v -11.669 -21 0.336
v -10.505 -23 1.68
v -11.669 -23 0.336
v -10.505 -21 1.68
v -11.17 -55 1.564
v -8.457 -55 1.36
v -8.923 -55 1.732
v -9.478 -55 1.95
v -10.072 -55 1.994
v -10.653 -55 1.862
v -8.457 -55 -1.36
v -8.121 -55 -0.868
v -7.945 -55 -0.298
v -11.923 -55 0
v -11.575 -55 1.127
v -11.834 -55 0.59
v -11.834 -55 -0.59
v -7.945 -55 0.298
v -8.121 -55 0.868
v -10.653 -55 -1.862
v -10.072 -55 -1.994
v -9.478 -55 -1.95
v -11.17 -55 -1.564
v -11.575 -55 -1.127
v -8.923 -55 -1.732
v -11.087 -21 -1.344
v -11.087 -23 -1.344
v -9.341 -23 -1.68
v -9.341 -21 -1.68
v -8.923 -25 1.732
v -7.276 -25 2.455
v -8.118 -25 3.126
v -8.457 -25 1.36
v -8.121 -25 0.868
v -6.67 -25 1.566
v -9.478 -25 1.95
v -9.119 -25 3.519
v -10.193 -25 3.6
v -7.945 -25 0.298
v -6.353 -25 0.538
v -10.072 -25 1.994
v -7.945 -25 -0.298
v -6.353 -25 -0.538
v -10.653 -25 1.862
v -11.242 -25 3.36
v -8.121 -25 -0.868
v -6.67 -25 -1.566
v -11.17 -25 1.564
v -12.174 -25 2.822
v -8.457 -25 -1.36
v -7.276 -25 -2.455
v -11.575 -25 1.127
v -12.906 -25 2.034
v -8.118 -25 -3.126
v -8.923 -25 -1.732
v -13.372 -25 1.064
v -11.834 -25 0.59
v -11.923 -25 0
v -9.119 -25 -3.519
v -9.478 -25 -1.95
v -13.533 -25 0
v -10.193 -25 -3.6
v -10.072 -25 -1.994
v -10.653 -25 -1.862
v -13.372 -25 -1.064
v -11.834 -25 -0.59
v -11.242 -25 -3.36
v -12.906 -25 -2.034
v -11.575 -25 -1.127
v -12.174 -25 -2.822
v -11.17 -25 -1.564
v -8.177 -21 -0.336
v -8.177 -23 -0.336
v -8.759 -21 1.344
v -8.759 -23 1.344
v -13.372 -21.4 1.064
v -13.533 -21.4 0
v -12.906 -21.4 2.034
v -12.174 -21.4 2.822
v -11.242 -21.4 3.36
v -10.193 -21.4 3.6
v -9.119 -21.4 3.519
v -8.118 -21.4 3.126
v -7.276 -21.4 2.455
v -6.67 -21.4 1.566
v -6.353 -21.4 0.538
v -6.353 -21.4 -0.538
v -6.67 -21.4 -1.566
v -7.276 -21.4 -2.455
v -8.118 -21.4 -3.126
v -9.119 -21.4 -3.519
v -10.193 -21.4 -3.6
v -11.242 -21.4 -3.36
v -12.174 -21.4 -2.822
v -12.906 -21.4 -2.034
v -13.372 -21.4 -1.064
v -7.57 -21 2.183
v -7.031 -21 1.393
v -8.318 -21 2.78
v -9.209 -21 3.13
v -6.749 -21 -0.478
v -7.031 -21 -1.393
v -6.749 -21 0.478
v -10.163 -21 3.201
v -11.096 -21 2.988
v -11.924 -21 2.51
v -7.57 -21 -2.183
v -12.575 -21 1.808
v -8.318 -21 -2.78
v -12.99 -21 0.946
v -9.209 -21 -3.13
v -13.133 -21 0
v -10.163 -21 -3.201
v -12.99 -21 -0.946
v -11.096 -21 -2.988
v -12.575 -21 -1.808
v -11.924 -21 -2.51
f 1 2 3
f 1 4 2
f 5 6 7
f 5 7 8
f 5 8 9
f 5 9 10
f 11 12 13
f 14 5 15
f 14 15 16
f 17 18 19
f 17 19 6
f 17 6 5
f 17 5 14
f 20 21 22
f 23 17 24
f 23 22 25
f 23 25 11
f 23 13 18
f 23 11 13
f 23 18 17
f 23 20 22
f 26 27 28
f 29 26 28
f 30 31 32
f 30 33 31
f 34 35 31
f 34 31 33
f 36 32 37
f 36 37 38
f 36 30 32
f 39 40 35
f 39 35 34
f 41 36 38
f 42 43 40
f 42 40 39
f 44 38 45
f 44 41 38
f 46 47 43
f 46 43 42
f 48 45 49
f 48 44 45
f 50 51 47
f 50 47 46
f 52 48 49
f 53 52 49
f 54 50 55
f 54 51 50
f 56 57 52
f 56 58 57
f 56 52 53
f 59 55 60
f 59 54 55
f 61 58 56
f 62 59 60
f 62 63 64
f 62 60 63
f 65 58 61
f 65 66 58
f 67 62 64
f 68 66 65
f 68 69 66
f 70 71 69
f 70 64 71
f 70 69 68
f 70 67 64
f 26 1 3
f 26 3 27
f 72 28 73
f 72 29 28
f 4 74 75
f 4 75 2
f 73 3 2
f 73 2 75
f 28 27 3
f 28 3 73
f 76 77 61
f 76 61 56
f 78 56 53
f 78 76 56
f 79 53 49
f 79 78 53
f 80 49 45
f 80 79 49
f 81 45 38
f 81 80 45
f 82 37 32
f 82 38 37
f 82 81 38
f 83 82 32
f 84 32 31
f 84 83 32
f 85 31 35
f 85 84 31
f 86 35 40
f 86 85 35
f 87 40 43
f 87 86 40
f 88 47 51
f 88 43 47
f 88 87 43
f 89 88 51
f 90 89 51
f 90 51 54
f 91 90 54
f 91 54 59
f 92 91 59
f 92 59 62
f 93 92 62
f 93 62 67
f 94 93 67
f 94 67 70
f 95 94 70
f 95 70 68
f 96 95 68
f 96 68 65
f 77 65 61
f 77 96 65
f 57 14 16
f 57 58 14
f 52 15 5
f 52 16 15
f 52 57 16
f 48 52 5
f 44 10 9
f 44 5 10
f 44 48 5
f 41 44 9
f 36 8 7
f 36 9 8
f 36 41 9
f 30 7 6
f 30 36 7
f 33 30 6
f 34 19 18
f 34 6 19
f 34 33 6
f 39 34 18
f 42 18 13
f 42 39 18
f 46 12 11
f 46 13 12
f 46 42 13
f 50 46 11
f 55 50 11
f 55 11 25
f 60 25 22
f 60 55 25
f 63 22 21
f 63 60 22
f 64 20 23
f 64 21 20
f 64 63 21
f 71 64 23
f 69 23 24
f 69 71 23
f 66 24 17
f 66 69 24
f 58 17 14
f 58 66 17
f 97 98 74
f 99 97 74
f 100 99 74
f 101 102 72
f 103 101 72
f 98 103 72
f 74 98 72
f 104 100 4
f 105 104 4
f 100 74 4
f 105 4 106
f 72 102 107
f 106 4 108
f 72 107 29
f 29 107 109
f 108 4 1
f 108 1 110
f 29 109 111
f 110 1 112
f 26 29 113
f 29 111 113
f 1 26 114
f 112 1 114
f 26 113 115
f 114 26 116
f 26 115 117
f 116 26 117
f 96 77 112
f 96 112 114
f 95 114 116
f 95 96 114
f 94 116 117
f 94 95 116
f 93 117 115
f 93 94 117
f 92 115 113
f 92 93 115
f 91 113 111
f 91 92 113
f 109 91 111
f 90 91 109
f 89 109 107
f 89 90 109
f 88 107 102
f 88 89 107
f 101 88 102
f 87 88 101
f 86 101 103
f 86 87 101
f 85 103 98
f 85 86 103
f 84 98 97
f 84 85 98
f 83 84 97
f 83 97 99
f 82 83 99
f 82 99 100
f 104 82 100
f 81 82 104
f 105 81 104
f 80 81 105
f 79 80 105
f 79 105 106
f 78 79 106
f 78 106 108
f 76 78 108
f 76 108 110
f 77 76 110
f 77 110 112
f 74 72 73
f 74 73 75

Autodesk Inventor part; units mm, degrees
ref_plane "YZ Plane" through (0, 0, 0) normal (1, 0, 0) x (0, 1, 0)
ref_plane "XZ Plane" through (0, 0, 0) normal (0, 1, 0) x (-1, 0, 0)
ref_plane "XY Plane" through (0, 0, 0) normal (0, 0, 1) x (1, 0, 0)
sketch "Sketch1" plane through (0, 0, 0) normal (0, 0, 1) x (1, 0, 0)
  line L0 (-9.9228, -25) -> (-13.5328, -25)
  line L1 (-13.5328, -25) -> (-13.5328, -21)
  line L2 (-13.5328, -21) -> (-9.9228, -21)
  line L3 (-9.9228, -21) -> (-9.9228, -25)
  line L4 (-9.9228, -25) -> (-9.9228, -55)
  line L5 (-9.9228, -55) -> (-11.9228, -55)
  line L6 (-11.9228, -55) -> (-11.9228, -25)
  point P0 (0, 0)
  dimension "d0" = 3.61
  dimension "d1" = 4
  dimension "d3" = 2
  dimension "d16" = 30
revolve "Revolution1" add sketch "Sketch1" angle 360 about axis through (-9.9228, -25, 0) along (0, -1, 0)
chamfer "Chamfer1" distance 0.4 angle 45 1 edges at (-6.3128, -21, 0)
sketch "Boceto2" plane through (-9.9228, -21, 0) normal (0, 1, 0) x (1, 0, 0)
  line L0 (1.1641, -1.3443) -> (-0.5821, -1.6803)
  line L1 (-0.5821, -1.6803) -> (-1.7462, -0.336)
  line L2 (-1.7462, -0.336) -> (-1.1641, 1.3443)
  line L3 (-1.1641, 1.3443) -> (0.5821, 1.6803)
  line L4 (0.5821, 1.6803) -> (1.7462, 0.336)
  line L5 (1.7462, 0.336) -> (1.1641, -1.3443)
  point P0 (9.9228, 0)
  point P1 (0, 0)
  dimension "d11" = 3.08
extrude "Extrusión1" cut sketch "Boceto2" against normal blind 2
thread "Rosca1" size "M4x0.7" class "6g" standard "ISO Metric profile" length 430
properties part number "Tornillo Allen cabeza cilindrica M4x30mm"
